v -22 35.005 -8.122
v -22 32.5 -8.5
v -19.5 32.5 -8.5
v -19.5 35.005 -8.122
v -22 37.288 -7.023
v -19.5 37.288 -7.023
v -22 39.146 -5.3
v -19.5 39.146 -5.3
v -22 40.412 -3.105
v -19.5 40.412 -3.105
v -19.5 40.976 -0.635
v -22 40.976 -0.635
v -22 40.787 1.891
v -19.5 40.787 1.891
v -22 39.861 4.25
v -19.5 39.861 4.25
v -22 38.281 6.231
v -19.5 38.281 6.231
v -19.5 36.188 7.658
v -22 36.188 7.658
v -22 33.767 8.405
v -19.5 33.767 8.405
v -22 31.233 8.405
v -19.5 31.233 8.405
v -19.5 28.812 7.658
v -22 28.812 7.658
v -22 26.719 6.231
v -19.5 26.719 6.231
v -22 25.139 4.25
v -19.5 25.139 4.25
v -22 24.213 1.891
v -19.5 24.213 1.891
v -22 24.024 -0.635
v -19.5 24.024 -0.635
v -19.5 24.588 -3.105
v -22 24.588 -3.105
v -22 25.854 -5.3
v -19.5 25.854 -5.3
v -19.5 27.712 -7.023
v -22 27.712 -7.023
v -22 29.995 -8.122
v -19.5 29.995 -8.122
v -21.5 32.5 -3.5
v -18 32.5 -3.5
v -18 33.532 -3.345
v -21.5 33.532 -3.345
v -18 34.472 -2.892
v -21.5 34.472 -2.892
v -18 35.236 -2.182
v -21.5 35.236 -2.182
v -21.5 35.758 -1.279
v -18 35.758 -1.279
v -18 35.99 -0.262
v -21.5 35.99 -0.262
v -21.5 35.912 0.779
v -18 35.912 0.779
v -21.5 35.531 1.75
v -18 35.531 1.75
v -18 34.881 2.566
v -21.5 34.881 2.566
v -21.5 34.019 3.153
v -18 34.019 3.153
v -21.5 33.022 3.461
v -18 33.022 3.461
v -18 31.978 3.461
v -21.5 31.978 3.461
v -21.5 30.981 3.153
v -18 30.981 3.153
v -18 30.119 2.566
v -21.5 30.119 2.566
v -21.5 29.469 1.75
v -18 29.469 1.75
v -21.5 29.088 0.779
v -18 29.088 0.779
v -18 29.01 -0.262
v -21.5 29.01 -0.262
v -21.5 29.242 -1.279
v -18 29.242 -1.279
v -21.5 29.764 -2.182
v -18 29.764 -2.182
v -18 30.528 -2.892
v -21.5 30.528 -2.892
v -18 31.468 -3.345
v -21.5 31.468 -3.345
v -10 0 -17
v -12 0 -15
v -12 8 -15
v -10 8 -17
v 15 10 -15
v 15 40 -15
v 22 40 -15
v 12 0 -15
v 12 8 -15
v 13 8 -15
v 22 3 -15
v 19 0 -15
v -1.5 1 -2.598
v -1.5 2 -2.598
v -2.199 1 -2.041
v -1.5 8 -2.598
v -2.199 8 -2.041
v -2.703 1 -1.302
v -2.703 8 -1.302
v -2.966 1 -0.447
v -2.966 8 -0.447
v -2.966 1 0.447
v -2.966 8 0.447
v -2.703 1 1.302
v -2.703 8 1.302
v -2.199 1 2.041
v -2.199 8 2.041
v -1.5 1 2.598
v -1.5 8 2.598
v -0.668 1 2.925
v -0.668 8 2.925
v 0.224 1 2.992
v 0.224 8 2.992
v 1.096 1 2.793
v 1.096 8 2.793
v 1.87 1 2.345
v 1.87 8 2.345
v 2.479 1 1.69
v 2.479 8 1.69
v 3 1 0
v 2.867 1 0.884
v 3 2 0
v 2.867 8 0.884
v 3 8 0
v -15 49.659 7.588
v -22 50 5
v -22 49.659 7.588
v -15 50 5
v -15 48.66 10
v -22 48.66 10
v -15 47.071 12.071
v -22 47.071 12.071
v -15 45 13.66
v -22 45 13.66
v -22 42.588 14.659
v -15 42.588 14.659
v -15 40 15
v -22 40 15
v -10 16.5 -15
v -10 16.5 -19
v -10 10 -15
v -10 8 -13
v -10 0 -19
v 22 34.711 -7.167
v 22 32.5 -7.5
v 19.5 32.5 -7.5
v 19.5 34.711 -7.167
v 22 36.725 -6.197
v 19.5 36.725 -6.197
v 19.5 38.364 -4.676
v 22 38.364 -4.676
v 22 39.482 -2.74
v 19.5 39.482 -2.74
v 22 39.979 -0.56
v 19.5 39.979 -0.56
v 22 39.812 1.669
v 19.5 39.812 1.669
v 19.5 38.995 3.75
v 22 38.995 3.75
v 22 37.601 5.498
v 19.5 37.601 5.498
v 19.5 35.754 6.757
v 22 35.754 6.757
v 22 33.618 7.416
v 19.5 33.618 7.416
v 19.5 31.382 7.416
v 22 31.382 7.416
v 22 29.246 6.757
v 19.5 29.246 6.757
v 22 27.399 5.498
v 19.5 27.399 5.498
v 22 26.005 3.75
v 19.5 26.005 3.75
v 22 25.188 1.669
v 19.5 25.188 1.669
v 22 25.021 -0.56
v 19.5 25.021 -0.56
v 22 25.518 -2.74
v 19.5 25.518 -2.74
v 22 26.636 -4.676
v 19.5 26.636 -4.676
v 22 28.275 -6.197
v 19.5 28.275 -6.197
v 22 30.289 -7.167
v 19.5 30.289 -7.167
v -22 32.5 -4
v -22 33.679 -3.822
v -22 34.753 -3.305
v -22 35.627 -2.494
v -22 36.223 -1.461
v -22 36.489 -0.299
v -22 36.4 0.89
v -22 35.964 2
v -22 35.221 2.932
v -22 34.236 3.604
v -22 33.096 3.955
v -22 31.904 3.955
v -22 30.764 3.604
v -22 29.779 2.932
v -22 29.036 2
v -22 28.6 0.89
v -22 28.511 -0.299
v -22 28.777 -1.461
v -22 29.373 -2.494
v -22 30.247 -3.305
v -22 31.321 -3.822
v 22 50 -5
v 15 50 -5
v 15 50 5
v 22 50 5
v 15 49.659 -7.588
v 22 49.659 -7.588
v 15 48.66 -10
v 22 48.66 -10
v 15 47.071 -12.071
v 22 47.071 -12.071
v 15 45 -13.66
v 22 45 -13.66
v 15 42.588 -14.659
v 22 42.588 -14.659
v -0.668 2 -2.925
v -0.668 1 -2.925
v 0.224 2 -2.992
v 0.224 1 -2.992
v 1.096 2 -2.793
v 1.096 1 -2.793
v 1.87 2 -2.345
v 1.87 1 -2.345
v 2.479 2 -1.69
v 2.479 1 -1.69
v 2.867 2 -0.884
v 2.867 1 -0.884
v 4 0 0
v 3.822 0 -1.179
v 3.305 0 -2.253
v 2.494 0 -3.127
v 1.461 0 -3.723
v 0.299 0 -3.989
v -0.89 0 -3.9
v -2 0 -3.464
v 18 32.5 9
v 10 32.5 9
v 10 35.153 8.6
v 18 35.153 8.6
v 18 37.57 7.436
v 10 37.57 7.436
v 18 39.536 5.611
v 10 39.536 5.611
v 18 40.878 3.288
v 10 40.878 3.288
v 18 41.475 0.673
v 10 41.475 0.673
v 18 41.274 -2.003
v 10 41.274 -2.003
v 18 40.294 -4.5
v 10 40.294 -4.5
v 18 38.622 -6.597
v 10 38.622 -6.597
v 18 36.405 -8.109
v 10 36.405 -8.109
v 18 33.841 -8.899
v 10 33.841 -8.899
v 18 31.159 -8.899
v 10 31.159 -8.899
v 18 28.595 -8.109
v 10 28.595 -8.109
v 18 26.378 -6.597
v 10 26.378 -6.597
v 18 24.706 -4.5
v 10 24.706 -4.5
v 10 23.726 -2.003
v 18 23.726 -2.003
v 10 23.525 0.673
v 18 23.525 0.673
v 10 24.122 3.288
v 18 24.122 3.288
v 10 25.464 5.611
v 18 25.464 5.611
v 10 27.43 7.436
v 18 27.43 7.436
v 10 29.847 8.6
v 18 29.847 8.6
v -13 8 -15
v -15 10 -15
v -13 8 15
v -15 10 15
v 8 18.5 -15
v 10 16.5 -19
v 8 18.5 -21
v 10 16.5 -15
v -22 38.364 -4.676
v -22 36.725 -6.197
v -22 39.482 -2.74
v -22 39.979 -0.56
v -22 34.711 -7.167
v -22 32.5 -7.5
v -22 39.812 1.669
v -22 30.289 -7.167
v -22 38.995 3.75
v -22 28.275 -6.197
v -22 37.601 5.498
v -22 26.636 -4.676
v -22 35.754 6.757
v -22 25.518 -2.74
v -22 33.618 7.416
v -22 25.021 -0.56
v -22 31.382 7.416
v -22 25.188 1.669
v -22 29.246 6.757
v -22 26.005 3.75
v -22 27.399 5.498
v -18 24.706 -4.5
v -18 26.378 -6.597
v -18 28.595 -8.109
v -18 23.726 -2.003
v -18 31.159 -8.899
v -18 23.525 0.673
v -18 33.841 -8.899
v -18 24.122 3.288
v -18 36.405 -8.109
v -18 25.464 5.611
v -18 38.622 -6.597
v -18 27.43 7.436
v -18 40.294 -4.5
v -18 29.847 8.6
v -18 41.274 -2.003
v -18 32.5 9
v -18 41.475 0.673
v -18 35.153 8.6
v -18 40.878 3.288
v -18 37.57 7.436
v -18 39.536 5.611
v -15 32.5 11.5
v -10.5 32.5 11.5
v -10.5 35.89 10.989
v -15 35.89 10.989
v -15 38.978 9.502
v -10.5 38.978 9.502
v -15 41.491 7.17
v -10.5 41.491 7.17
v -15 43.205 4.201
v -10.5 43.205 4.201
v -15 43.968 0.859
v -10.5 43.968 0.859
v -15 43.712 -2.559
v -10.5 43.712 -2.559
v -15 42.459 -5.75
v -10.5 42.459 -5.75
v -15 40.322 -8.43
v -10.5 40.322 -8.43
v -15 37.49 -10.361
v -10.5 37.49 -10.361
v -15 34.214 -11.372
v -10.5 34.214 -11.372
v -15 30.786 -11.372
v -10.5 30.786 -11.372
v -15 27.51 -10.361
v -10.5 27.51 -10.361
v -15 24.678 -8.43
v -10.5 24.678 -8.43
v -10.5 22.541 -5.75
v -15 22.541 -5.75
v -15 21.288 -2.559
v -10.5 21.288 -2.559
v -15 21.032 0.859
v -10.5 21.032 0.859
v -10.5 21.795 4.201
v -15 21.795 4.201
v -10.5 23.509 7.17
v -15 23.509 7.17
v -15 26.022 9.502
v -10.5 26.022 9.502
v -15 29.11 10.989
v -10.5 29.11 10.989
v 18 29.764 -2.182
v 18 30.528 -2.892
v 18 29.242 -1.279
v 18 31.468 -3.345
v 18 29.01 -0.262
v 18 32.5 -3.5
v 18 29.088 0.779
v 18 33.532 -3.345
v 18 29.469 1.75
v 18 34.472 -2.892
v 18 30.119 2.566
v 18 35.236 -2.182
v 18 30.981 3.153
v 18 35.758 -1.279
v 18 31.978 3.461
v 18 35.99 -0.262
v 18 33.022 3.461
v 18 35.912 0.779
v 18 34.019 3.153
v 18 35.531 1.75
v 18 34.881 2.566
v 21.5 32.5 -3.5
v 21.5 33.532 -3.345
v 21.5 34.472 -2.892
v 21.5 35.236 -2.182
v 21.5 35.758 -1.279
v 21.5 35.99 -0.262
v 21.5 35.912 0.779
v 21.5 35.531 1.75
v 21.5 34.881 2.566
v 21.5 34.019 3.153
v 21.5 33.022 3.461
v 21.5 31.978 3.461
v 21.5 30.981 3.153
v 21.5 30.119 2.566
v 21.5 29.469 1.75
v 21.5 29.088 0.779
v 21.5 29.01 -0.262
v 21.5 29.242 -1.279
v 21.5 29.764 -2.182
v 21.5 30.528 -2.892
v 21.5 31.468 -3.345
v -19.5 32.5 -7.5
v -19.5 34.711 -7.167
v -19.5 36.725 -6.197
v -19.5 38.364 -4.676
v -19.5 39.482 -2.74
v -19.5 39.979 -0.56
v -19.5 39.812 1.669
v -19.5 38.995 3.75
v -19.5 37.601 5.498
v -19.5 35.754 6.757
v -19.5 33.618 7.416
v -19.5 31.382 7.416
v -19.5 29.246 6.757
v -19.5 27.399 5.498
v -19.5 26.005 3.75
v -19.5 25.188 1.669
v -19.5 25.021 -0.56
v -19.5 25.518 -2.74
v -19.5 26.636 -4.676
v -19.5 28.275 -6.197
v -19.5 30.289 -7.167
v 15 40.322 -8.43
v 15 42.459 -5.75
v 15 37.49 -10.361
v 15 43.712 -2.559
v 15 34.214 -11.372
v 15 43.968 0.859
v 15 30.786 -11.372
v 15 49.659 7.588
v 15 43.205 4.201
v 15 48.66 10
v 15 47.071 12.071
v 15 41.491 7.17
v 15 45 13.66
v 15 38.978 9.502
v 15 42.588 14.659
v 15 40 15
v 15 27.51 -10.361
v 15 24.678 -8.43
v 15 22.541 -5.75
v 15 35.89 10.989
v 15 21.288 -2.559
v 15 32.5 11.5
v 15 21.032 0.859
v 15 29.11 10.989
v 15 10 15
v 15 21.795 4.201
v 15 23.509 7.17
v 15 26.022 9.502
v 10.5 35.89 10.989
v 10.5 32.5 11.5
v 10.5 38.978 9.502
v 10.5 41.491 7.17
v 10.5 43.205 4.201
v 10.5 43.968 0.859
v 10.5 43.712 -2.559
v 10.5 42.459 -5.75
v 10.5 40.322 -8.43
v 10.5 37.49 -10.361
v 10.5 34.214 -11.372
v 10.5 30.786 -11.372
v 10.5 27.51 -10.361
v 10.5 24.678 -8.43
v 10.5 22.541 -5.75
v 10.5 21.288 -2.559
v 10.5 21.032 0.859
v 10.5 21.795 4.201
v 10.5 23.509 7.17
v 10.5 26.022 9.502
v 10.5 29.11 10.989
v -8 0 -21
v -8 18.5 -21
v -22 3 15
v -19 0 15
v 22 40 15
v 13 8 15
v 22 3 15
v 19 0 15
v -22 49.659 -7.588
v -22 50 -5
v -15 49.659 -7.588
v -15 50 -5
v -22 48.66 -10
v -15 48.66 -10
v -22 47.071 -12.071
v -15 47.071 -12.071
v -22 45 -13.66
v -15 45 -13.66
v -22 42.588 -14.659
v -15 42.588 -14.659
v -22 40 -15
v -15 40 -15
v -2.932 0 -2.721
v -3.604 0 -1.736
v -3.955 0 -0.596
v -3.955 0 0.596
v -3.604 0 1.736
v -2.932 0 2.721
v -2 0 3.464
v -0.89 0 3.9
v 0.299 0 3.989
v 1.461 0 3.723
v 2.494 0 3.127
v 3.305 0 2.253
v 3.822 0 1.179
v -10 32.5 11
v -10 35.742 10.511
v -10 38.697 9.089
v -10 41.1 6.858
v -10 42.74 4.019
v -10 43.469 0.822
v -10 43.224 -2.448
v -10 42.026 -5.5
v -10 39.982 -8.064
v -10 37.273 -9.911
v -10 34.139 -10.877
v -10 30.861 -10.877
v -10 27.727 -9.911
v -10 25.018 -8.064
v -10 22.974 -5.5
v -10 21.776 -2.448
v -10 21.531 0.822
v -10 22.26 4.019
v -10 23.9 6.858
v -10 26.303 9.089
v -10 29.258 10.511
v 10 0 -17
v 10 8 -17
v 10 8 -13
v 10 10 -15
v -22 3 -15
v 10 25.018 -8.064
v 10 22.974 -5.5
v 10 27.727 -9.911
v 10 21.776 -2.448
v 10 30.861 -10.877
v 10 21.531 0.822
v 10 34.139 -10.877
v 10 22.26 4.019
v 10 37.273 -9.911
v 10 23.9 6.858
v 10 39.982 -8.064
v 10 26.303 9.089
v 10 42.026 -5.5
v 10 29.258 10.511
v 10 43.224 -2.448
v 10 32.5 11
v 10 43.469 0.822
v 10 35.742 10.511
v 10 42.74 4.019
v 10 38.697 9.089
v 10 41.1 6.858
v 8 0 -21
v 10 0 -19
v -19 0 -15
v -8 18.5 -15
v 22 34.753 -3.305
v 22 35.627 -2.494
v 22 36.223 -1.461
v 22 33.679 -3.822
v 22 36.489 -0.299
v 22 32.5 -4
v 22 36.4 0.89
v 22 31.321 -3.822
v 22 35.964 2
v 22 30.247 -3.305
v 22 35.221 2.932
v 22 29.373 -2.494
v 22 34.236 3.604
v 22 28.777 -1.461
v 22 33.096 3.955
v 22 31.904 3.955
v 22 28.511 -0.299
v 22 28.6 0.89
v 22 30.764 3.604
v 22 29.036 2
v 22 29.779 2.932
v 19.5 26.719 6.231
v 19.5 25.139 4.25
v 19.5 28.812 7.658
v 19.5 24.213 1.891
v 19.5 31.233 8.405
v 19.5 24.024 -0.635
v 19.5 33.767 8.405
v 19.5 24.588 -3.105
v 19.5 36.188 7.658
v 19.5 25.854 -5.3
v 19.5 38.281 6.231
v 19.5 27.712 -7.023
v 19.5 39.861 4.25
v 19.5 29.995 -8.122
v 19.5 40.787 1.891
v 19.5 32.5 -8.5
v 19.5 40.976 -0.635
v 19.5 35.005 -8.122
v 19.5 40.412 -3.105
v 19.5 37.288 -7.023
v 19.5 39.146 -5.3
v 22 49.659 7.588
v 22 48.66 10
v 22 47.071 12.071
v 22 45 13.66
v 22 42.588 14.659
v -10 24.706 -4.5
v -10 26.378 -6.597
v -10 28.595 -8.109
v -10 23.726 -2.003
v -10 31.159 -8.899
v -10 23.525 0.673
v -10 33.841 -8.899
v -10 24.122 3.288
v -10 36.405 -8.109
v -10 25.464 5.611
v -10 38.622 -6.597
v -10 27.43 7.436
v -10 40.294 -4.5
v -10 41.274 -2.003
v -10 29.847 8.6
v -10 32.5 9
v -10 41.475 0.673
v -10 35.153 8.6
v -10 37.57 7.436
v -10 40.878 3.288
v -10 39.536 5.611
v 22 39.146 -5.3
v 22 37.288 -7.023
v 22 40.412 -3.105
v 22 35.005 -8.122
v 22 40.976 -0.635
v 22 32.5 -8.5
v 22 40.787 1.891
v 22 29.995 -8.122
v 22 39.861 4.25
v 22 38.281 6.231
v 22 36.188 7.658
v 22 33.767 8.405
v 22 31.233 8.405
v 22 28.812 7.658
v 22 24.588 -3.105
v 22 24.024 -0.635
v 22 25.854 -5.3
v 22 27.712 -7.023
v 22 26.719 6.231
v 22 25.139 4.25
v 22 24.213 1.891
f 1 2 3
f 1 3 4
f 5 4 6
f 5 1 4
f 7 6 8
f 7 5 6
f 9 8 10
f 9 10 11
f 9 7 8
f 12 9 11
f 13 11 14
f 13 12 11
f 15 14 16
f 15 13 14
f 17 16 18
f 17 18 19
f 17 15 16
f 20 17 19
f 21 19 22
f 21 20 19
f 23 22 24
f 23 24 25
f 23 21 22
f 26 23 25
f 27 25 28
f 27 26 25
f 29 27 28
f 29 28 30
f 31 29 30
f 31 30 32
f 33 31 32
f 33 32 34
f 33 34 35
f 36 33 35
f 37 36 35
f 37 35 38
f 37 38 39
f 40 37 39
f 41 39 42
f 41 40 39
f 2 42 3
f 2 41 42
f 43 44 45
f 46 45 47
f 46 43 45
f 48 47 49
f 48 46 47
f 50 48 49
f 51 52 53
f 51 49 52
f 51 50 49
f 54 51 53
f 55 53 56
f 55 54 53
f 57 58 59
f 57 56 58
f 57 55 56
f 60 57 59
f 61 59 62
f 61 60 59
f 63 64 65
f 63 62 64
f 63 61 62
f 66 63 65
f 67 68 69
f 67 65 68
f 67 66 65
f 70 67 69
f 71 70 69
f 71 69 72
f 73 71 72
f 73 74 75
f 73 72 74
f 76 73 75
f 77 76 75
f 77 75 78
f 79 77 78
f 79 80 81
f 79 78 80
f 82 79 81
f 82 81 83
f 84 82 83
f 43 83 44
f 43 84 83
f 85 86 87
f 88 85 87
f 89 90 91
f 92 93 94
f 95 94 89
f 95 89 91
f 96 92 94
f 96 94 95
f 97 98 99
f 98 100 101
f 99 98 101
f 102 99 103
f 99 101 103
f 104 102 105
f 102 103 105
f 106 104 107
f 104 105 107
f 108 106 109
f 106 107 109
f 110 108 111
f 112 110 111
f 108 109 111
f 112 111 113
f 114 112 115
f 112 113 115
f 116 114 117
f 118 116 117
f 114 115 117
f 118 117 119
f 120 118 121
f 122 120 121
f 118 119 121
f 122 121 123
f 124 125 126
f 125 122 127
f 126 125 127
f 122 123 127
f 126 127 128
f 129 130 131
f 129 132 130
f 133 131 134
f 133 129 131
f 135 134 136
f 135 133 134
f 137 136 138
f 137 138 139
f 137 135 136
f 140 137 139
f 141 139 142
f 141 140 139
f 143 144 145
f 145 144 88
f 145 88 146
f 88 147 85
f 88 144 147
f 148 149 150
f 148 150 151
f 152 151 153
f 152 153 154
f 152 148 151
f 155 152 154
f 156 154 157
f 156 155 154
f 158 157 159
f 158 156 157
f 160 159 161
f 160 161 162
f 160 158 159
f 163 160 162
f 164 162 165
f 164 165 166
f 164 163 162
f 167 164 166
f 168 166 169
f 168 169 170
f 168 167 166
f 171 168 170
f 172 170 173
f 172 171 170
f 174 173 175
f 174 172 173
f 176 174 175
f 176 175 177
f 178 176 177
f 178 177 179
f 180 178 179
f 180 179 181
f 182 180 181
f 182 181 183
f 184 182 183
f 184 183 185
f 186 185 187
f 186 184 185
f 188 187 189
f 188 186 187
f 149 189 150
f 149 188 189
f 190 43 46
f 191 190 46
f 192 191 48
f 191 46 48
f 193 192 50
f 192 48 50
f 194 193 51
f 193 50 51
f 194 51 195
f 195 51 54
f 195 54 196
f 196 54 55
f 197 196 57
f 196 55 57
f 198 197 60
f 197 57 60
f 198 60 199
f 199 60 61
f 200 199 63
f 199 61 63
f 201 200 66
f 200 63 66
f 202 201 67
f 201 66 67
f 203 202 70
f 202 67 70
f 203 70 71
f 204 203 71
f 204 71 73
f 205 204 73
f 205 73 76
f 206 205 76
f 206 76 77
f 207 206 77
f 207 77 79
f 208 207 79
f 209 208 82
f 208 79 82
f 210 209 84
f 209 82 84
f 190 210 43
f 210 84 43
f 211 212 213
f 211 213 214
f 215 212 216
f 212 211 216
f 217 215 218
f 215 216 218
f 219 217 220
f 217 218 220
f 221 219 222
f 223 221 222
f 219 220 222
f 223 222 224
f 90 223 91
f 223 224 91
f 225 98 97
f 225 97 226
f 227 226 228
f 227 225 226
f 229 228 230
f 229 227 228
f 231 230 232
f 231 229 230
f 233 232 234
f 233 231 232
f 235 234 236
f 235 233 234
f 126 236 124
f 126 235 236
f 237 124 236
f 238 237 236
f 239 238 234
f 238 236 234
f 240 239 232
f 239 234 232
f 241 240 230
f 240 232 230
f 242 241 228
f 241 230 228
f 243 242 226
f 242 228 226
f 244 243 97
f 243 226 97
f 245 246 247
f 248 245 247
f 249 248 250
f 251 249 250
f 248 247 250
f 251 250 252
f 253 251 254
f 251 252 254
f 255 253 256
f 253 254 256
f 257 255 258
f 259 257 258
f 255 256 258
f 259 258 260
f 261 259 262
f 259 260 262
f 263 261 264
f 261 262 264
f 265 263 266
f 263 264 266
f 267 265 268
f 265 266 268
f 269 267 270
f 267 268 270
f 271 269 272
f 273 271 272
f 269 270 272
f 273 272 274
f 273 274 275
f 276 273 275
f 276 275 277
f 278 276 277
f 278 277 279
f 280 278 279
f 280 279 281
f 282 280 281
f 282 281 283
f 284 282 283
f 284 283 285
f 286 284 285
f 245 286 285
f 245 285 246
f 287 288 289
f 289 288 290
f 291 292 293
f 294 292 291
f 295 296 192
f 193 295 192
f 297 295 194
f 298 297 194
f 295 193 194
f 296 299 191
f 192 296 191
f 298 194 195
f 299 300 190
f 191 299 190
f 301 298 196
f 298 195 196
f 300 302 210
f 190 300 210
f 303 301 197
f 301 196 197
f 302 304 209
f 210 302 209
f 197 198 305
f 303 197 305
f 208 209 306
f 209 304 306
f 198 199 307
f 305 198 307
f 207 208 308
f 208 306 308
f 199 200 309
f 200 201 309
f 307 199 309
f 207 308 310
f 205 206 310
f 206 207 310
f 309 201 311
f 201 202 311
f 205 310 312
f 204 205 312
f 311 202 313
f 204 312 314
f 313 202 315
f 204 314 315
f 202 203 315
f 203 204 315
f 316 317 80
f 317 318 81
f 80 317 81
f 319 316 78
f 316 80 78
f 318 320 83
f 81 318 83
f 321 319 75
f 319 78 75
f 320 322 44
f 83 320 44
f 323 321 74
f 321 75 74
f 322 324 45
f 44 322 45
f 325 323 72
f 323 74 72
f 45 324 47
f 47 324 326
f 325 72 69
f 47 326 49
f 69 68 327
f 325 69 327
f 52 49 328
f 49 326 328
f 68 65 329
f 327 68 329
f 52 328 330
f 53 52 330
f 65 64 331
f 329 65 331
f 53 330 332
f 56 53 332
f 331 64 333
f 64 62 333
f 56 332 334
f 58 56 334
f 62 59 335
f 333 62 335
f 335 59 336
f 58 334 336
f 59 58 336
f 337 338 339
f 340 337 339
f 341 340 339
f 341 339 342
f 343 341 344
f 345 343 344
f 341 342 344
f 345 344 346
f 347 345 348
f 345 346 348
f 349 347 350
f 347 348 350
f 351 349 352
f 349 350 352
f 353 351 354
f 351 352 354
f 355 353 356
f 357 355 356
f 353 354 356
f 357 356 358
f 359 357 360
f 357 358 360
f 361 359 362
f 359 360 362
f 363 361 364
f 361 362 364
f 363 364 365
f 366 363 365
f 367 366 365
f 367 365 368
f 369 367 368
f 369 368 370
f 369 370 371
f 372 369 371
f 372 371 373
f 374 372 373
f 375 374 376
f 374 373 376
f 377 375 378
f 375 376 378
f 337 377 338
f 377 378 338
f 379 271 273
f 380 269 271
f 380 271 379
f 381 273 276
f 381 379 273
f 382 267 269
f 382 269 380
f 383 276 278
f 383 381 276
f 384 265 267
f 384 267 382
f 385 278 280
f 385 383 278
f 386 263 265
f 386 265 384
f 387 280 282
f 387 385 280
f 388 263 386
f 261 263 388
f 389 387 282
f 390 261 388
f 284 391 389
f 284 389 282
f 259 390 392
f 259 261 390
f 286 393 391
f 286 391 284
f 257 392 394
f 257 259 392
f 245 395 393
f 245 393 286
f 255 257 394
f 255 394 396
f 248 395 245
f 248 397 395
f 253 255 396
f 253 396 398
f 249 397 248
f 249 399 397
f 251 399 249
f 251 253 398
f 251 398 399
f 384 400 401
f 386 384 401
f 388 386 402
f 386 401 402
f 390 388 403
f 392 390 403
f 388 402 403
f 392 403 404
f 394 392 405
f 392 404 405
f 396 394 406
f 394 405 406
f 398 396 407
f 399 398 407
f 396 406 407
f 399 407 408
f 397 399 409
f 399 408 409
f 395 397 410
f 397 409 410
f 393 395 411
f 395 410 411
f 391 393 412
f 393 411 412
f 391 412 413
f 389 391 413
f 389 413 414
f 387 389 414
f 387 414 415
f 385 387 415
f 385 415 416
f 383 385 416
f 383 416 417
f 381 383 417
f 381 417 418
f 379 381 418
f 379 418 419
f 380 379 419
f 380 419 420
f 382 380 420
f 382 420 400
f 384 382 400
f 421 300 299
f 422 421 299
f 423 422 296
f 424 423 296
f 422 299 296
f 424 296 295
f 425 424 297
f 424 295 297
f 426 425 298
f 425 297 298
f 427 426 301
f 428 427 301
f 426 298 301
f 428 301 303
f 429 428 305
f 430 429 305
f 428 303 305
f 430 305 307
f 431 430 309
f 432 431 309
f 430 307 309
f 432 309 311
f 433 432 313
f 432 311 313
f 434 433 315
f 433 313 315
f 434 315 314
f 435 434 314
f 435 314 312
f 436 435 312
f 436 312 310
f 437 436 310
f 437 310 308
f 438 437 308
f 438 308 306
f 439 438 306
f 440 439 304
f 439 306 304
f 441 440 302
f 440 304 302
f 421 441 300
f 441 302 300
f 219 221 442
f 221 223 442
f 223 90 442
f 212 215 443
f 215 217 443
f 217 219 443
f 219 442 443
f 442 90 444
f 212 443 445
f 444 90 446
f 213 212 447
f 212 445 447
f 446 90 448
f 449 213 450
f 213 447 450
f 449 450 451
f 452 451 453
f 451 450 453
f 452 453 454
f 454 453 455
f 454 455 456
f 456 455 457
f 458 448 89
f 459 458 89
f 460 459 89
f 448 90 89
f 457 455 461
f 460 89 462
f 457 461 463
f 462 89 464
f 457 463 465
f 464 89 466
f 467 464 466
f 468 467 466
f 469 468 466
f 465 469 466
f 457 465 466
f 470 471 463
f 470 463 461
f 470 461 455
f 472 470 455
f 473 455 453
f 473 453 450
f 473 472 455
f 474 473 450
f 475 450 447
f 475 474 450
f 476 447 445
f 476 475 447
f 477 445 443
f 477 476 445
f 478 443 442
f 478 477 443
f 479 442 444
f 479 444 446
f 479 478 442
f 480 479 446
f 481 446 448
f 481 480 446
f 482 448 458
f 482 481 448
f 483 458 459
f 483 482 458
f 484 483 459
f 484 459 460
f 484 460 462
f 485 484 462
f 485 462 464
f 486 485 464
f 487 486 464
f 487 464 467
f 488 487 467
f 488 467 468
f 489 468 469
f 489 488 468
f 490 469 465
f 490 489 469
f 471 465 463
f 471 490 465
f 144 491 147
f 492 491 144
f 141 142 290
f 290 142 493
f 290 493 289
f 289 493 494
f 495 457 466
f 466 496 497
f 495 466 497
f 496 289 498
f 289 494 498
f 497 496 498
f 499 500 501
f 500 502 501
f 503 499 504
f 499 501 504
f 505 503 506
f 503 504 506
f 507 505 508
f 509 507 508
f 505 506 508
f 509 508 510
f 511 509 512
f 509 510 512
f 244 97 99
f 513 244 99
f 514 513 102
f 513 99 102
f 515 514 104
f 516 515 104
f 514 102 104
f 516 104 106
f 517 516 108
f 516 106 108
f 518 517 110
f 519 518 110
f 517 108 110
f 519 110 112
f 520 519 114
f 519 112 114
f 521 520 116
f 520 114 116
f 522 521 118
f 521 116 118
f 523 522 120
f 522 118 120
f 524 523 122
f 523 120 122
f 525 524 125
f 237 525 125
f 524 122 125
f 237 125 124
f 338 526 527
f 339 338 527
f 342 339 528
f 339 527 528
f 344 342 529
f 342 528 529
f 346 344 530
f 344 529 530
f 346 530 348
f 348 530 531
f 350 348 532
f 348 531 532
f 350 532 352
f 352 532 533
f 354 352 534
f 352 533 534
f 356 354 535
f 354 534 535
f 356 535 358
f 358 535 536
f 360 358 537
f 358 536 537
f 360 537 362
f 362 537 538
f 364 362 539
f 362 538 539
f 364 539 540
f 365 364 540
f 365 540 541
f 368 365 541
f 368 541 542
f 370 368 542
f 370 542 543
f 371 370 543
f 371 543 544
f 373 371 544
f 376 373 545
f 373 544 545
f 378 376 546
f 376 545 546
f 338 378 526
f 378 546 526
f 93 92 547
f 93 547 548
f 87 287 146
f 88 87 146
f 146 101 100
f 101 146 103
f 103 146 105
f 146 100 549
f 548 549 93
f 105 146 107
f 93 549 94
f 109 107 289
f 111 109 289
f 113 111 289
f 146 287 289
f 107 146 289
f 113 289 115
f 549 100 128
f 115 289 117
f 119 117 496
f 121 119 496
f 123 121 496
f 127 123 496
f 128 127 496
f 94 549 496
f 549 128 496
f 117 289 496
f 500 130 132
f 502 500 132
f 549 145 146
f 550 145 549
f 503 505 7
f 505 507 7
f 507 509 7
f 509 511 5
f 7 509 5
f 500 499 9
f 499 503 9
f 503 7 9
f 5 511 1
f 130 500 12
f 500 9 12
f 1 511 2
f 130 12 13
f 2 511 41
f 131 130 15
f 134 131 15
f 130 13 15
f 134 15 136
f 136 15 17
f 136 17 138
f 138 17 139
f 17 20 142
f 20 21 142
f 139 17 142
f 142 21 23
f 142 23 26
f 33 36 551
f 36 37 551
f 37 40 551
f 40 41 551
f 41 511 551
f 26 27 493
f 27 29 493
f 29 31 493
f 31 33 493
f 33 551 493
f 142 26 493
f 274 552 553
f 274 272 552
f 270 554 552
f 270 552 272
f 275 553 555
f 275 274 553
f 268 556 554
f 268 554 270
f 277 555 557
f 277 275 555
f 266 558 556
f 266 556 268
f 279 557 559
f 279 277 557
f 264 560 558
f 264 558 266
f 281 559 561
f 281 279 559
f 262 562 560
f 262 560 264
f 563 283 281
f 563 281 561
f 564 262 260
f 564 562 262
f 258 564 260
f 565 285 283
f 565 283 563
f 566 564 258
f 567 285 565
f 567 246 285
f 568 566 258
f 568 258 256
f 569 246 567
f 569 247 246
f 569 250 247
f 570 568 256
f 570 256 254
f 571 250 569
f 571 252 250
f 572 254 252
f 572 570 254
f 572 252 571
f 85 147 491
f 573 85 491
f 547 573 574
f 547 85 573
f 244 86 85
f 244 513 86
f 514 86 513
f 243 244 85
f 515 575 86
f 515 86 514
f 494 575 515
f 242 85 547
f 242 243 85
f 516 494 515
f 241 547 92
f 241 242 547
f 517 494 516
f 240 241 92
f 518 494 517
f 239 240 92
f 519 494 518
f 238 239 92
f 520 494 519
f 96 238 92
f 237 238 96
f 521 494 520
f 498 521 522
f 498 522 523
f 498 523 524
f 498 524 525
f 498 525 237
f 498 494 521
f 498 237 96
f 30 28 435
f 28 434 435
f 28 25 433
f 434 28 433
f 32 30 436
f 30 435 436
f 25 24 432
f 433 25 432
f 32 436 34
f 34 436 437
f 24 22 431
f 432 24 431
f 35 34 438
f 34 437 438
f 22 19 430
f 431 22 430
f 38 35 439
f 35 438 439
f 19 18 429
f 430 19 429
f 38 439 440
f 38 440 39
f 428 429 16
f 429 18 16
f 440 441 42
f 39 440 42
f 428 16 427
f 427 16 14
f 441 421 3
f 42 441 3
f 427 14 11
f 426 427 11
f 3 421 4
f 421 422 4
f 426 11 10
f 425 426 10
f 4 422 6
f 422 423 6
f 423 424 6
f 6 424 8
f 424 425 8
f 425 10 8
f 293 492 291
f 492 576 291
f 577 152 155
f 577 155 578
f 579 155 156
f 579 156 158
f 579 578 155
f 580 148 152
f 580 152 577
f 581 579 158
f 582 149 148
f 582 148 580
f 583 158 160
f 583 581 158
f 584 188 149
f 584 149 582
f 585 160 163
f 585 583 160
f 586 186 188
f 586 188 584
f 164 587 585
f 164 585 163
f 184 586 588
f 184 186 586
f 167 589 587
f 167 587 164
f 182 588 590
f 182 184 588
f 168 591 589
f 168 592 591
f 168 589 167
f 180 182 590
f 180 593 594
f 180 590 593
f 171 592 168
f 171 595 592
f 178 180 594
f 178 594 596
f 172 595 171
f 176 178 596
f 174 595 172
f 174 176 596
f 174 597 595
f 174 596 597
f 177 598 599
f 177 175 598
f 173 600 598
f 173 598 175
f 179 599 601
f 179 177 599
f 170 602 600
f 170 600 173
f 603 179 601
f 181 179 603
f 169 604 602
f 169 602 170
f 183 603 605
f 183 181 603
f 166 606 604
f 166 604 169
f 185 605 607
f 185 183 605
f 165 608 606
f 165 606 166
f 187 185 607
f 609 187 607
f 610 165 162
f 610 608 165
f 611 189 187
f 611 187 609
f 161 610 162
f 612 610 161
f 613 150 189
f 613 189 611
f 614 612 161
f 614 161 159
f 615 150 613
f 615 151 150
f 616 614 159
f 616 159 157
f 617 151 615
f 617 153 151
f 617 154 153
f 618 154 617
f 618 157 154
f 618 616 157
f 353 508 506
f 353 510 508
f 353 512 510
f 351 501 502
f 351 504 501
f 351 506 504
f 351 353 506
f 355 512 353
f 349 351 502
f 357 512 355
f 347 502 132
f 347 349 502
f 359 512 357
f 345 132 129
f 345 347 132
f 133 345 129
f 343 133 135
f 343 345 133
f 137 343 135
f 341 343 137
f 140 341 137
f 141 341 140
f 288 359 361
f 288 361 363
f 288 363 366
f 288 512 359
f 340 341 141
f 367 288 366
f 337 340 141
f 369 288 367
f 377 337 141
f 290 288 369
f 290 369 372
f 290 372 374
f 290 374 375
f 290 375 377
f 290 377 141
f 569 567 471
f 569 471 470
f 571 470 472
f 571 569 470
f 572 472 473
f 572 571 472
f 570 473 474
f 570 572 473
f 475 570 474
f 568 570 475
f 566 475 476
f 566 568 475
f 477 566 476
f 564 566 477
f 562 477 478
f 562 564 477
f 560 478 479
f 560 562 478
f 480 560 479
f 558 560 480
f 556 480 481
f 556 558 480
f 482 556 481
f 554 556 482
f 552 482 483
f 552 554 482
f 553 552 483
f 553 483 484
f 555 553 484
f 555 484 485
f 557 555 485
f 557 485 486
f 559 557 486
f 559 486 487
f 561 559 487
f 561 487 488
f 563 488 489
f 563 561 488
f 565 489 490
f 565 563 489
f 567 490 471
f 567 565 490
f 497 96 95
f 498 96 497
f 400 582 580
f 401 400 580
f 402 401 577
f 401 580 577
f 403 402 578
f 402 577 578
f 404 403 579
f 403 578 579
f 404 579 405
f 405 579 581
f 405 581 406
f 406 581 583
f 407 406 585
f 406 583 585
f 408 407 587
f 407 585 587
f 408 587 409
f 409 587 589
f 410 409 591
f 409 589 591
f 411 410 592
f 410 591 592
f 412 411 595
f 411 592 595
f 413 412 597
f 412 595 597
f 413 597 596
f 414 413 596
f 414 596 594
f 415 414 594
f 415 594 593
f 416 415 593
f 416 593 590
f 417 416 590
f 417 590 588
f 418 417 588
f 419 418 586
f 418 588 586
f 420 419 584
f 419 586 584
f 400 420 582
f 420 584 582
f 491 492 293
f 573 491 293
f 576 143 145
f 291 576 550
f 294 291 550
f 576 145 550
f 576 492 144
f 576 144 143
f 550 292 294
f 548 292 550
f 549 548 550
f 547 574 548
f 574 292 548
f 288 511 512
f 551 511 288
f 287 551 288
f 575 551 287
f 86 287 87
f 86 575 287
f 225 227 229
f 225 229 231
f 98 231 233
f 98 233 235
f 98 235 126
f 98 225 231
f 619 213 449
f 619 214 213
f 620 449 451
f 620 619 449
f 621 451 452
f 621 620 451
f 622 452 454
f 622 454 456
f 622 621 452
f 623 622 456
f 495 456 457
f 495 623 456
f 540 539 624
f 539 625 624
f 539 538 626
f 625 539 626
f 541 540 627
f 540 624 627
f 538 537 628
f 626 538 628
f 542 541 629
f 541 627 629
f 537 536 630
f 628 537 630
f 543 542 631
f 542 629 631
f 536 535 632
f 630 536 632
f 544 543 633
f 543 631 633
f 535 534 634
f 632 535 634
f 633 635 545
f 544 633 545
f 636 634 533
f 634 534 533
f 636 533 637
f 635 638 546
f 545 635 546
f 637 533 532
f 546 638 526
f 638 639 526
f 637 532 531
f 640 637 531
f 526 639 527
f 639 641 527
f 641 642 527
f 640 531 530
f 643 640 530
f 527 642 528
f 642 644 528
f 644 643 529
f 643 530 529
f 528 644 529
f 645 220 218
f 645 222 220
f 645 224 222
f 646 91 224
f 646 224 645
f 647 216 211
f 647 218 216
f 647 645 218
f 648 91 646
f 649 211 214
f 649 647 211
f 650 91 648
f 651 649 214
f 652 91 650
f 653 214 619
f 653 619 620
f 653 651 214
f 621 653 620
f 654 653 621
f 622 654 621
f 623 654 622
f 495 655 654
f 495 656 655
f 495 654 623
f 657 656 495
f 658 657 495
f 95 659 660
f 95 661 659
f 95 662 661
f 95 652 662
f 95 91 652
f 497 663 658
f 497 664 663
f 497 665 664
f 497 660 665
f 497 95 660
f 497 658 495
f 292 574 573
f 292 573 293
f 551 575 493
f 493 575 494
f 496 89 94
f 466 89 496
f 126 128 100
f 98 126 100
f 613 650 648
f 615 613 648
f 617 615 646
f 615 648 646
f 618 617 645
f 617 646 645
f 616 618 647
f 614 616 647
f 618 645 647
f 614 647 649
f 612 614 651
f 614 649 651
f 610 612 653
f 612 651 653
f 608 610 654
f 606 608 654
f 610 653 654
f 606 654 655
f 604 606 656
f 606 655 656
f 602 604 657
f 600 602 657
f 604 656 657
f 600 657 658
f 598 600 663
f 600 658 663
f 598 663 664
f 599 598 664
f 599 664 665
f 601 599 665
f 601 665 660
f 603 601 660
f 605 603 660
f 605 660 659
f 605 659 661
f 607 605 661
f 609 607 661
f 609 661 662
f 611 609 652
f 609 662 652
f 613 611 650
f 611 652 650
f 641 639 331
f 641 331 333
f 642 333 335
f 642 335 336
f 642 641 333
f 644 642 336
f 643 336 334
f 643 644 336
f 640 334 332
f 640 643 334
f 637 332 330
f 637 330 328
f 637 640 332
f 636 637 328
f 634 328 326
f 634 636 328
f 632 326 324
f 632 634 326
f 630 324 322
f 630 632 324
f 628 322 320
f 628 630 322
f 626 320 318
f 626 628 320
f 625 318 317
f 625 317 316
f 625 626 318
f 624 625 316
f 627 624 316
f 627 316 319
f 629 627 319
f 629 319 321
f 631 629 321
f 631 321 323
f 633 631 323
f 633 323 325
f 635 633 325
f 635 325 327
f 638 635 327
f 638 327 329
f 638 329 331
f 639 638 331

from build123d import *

# Parameters (mm, degrees)
SKETCH_1_R          = 10
EXTRUDE_1_DEPTH     = 13
CUT_EXTRUDE_2_DEPTH = 20.209373
SKETCH_7_W          = 30
SKETCH_7_H          = 30
SKETCH_7_R          = 10
EXTRUDE_2_DEPTH     = 8
SKETCH_11_W         = 7
SKETCH_11_H         = 30
EXTRUDE_6_DEPTH     = 50
FILLET_2_R          = 10
SKETCH_13_R         = 8.5
SKETCH_13_R_2       = 7.5
CUT_EXTRUDE_3_DEPTH = 2.5
SKETCH_14_R         = 3.5
CUT_EXTRUDE_4_DEPTH = 37
SKETCH_22_W         = 20
SKETCH_22_H         = 6
EXTRUDE_8_DEPTH     = 18.5
CHAMFER_7_SIZE      = 2
SKETCH_23_R         = 9
CUT_EXTRUDE_6_DEPTH = 3
CHAMFER_8_SIZE      = 2
CUT_EXTRUDE_START   = -5
SKETCH_24_R         = 10
CUT_EXTRUDE_7_DEPTH = 5
CUT_EXTRUDE_START_2 = -2
SKETCH_25_R         = 3
CUT_EXTRUDE_8_DEPTH = 2
CHAMFER_9_SIZE      = 3
CHAMFER_10_SIZE     = 1
CHAMFER_3_SIZE      = 2
EXTRUDE_START       = 5
SKETCH_26_R         = 11.5
SKETCH_26_R_2       = 9
EXTRUDE_9_DEPTH     = 5
CHAMFER_4_SIZE      = 0.5


with BuildPart() as part:
    # 草图1 → 凸台-拉伸1 (new body)
    with BuildSketch(Plane(origin=(0, 0, 0), x_dir=(1, 0, 0), z_dir=(0, 1, 0))):
        with Locations(Location((0, 0, 0), (0, 0, 90))):
            Circle(SKETCH_1_R)
    extrude(amount=EXTRUDE_1_DEPTH)

    # 草图4 → 切除-拉伸2 (cut, through all)
    with BuildSketch(Plane(origin=(0, 13, 0), x_dir=(1, 0, 0), z_dir=(0, 1, 0))):
        with BuildLine():
            Line((3, 0), (-1.5, 2.598076))
            ThreePointArc((-1.5, 2.598076), (-1.5, -2.598076), (3, 0))
        make_face()
    extrude(amount=-CUT_EXTRUDE_2_DEPTH, mode=Mode.SUBTRACT)

    # 草图7 → 凸台-拉伸2 (add)
    with BuildSketch(Plane.XZ):
        Rectangle(SKETCH_7_W, SKETCH_7_H)
        with Locations(Location((0, 0, 0), (0, 0, 270))):
            Circle(SKETCH_7_R, mode=Mode.SUBTRACT)
    extrude(amount=-EXTRUDE_2_DEPTH)

    # 草图11 → 凸台-拉伸6 (add)
    with BuildSketch(Plane.XZ):
        with Locations((-18.5, 0)):
            Rectangle(SKETCH_11_W, SKETCH_11_H)
        with Locations((18.5, 0)):
            Rectangle(SKETCH_11_W, SKETCH_11_H)
    extrude(amount=-EXTRUDE_6_DEPTH)

    # 圆角2
    fillet_2_edges = [part.edges().sort_by_distance(p)[0] for p in [
        (-18.5, 50, -15),
        (-18.5, 50, 15),
        (18.5, 50, 15),
        (18.5, 50, -15),
    ]]
    fillet(fillet_2_edges, radius=FILLET_2_R)

    # 草图13 → 切除-拉伸3 (cut)
    with BuildSketch(Plane(origin=(22, 0, 0), x_dir=(0, 0, -1), z_dir=(1, 0, 0))):
        with Locations((0, 32.5)):
            Circle(SKETCH_13_R)
        with Locations((0, 32.5)):
            Circle(SKETCH_13_R_2, mode=Mode.SUBTRACT)
    cut_extrude_3 = extrude(amount=-CUT_EXTRUDE_3_DEPTH, mode=Mode.SUBTRACT)

    # 草图14 → 切除-拉伸4 (cut)
    with BuildSketch(Plane(origin=(22, 0, 0), x_dir=(0, 0, -1), z_dir=(1, 0, 0))):
        with Locations((0, 32.5)):
            Circle(SKETCH_14_R)
    cut_extrude_4 = extrude(amount=-CUT_EXTRUDE_4_DEPTH, mode=Mode.SUBTRACT)

    # 草图22 → 凸台-拉伸8 (add)
    with BuildSketch(Plane.XZ):
        with Locations((0, -18)):
            Rectangle(SKETCH_22_W, SKETCH_22_H)
    extrude(amount=-EXTRUDE_8_DEPTH)

    # 倒角7
    chamfer_7_edges = [part.edges().sort_by_distance(p)[0] for p in [
        (10, 4, -15),
        (-10, 4, -15),
    ]]
    chamfer(chamfer_7_edges, length=CHAMFER_7_SIZE)

    # 草图23 → 切除-拉伸6 (cut)
    with BuildSketch(Plane.ZY.offset(-15)):
        with Locations((0, 32.5)):
            Circle(SKETCH_23_R)
    cut_extrude_6 = extrude(amount=-CUT_EXTRUDE_6_DEPTH, mode=Mode.SUBTRACT)

    # 倒角8
    chamfer_8_edges = [part.edges().sort_by_distance(p)[0] for p in [
        (10, 18.5, -18),
        (10, 9.25, -21),
        (-10, 18.5, -18),
        (-10, 9.25, -21),
    ]]
    chamfer(chamfer_8_edges, length=CHAMFER_8_SIZE)

    # 草图24 → 切除-拉伸7 (cut)
    with BuildSketch(Plane(origin=(0, 13, 0), x_dir=(1, 0, 0), z_dir=(0, 1, 0)).offset(CUT_EXTRUDE_START)):
        Circle(SKETCH_24_R)
    extrude(amount=CUT_EXTRUDE_7_DEPTH, mode=Mode.SUBTRACT)

    # 草图25 → 切除-拉伸8 (cut)
    with BuildSketch(Plane.XZ.offset(CUT_EXTRUDE_START_2)):
        with Locations(Location((0, 0, 0), (0, 0, 90))):
            Circle(SKETCH_25_R)
    extrude(amount=CUT_EXTRUDE_8_DEPTH, mode=Mode.SUBTRACT)

    # 倒角9
    chamfer_9_edges = [part.edges().sort_by_distance(p)[0] for p in [
        (-22, 0, 0),
        (22, 0, 0),
    ]]
    chamfer(chamfer_9_edges, length=CHAMFER_9_SIZE)

    # 倒角10
    chamfer_10_edges = [part.edges().sort_by_distance(p)[0] for p in [
        (1.5, 0, 2.598076),
    ]]
    chamfer(chamfer_10_edges, length=CHAMFER_10_SIZE)

    # 倒角3
    chamfer_3_edges = [part.edges().sort_by_distance(p)[0] for p in [
        (15, 8, 0),
        (-15, 8, 0),
        (0, 8, -15),
    ]]
    chamfer(chamfer_3_edges, length=CHAMFER_3_SIZE)

    # 草图26 → 凸台-拉伸9 (add)
    with BuildSketch(Plane.ZY.offset(-15).offset(EXTRUDE_START)):
        with Locations((0, 32.5)):
            Circle(SKETCH_26_R)
        with Locations((0, 32.5)):
            Circle(SKETCH_26_R_2, mode=Mode.SUBTRACT)
    extrude_9 = extrude(amount=-EXTRUDE_9_DEPTH)

    # 镜向2: 切除-拉伸3, 切除-拉伸4, 切除-拉伸6, 凸台-拉伸9 across plane
    add(cut_extrude_3.mirror(Plane(origin=(0, 0, 0), x_dir=(0, 0, 1), z_dir=(1, 0, 0))), mode=Mode.SUBTRACT)
    add(cut_extrude_4.mirror(Plane(origin=(0, 0, 0), x_dir=(0, 0, 1), z_dir=(1, 0, 0))), mode=Mode.SUBTRACT)
    add(cut_extrude_6.mirror(Plane(origin=(0, 0, 0), x_dir=(0, 0, 1), z_dir=(1, 0, 0))), mode=Mode.SUBTRACT)
    add(extrude_9.mirror(Plane(origin=(0, 0, 0), x_dir=(0, 0, 1), z_dir=(1, 0, 0))))

    # 倒角4
    chamfer_4_edges = [part.edges().sort_by_distance(p)[0] for p in [
        (10, 32.5, -11.5),
        (-22, 32.5, 3.5),
        (-10, 32.5, -11.5),
        (22, 32.5, 3.5),
    ]]
    chamfer(chamfer_4_edges, length=CHAMFER_4_SIZE)


solid = part.part
